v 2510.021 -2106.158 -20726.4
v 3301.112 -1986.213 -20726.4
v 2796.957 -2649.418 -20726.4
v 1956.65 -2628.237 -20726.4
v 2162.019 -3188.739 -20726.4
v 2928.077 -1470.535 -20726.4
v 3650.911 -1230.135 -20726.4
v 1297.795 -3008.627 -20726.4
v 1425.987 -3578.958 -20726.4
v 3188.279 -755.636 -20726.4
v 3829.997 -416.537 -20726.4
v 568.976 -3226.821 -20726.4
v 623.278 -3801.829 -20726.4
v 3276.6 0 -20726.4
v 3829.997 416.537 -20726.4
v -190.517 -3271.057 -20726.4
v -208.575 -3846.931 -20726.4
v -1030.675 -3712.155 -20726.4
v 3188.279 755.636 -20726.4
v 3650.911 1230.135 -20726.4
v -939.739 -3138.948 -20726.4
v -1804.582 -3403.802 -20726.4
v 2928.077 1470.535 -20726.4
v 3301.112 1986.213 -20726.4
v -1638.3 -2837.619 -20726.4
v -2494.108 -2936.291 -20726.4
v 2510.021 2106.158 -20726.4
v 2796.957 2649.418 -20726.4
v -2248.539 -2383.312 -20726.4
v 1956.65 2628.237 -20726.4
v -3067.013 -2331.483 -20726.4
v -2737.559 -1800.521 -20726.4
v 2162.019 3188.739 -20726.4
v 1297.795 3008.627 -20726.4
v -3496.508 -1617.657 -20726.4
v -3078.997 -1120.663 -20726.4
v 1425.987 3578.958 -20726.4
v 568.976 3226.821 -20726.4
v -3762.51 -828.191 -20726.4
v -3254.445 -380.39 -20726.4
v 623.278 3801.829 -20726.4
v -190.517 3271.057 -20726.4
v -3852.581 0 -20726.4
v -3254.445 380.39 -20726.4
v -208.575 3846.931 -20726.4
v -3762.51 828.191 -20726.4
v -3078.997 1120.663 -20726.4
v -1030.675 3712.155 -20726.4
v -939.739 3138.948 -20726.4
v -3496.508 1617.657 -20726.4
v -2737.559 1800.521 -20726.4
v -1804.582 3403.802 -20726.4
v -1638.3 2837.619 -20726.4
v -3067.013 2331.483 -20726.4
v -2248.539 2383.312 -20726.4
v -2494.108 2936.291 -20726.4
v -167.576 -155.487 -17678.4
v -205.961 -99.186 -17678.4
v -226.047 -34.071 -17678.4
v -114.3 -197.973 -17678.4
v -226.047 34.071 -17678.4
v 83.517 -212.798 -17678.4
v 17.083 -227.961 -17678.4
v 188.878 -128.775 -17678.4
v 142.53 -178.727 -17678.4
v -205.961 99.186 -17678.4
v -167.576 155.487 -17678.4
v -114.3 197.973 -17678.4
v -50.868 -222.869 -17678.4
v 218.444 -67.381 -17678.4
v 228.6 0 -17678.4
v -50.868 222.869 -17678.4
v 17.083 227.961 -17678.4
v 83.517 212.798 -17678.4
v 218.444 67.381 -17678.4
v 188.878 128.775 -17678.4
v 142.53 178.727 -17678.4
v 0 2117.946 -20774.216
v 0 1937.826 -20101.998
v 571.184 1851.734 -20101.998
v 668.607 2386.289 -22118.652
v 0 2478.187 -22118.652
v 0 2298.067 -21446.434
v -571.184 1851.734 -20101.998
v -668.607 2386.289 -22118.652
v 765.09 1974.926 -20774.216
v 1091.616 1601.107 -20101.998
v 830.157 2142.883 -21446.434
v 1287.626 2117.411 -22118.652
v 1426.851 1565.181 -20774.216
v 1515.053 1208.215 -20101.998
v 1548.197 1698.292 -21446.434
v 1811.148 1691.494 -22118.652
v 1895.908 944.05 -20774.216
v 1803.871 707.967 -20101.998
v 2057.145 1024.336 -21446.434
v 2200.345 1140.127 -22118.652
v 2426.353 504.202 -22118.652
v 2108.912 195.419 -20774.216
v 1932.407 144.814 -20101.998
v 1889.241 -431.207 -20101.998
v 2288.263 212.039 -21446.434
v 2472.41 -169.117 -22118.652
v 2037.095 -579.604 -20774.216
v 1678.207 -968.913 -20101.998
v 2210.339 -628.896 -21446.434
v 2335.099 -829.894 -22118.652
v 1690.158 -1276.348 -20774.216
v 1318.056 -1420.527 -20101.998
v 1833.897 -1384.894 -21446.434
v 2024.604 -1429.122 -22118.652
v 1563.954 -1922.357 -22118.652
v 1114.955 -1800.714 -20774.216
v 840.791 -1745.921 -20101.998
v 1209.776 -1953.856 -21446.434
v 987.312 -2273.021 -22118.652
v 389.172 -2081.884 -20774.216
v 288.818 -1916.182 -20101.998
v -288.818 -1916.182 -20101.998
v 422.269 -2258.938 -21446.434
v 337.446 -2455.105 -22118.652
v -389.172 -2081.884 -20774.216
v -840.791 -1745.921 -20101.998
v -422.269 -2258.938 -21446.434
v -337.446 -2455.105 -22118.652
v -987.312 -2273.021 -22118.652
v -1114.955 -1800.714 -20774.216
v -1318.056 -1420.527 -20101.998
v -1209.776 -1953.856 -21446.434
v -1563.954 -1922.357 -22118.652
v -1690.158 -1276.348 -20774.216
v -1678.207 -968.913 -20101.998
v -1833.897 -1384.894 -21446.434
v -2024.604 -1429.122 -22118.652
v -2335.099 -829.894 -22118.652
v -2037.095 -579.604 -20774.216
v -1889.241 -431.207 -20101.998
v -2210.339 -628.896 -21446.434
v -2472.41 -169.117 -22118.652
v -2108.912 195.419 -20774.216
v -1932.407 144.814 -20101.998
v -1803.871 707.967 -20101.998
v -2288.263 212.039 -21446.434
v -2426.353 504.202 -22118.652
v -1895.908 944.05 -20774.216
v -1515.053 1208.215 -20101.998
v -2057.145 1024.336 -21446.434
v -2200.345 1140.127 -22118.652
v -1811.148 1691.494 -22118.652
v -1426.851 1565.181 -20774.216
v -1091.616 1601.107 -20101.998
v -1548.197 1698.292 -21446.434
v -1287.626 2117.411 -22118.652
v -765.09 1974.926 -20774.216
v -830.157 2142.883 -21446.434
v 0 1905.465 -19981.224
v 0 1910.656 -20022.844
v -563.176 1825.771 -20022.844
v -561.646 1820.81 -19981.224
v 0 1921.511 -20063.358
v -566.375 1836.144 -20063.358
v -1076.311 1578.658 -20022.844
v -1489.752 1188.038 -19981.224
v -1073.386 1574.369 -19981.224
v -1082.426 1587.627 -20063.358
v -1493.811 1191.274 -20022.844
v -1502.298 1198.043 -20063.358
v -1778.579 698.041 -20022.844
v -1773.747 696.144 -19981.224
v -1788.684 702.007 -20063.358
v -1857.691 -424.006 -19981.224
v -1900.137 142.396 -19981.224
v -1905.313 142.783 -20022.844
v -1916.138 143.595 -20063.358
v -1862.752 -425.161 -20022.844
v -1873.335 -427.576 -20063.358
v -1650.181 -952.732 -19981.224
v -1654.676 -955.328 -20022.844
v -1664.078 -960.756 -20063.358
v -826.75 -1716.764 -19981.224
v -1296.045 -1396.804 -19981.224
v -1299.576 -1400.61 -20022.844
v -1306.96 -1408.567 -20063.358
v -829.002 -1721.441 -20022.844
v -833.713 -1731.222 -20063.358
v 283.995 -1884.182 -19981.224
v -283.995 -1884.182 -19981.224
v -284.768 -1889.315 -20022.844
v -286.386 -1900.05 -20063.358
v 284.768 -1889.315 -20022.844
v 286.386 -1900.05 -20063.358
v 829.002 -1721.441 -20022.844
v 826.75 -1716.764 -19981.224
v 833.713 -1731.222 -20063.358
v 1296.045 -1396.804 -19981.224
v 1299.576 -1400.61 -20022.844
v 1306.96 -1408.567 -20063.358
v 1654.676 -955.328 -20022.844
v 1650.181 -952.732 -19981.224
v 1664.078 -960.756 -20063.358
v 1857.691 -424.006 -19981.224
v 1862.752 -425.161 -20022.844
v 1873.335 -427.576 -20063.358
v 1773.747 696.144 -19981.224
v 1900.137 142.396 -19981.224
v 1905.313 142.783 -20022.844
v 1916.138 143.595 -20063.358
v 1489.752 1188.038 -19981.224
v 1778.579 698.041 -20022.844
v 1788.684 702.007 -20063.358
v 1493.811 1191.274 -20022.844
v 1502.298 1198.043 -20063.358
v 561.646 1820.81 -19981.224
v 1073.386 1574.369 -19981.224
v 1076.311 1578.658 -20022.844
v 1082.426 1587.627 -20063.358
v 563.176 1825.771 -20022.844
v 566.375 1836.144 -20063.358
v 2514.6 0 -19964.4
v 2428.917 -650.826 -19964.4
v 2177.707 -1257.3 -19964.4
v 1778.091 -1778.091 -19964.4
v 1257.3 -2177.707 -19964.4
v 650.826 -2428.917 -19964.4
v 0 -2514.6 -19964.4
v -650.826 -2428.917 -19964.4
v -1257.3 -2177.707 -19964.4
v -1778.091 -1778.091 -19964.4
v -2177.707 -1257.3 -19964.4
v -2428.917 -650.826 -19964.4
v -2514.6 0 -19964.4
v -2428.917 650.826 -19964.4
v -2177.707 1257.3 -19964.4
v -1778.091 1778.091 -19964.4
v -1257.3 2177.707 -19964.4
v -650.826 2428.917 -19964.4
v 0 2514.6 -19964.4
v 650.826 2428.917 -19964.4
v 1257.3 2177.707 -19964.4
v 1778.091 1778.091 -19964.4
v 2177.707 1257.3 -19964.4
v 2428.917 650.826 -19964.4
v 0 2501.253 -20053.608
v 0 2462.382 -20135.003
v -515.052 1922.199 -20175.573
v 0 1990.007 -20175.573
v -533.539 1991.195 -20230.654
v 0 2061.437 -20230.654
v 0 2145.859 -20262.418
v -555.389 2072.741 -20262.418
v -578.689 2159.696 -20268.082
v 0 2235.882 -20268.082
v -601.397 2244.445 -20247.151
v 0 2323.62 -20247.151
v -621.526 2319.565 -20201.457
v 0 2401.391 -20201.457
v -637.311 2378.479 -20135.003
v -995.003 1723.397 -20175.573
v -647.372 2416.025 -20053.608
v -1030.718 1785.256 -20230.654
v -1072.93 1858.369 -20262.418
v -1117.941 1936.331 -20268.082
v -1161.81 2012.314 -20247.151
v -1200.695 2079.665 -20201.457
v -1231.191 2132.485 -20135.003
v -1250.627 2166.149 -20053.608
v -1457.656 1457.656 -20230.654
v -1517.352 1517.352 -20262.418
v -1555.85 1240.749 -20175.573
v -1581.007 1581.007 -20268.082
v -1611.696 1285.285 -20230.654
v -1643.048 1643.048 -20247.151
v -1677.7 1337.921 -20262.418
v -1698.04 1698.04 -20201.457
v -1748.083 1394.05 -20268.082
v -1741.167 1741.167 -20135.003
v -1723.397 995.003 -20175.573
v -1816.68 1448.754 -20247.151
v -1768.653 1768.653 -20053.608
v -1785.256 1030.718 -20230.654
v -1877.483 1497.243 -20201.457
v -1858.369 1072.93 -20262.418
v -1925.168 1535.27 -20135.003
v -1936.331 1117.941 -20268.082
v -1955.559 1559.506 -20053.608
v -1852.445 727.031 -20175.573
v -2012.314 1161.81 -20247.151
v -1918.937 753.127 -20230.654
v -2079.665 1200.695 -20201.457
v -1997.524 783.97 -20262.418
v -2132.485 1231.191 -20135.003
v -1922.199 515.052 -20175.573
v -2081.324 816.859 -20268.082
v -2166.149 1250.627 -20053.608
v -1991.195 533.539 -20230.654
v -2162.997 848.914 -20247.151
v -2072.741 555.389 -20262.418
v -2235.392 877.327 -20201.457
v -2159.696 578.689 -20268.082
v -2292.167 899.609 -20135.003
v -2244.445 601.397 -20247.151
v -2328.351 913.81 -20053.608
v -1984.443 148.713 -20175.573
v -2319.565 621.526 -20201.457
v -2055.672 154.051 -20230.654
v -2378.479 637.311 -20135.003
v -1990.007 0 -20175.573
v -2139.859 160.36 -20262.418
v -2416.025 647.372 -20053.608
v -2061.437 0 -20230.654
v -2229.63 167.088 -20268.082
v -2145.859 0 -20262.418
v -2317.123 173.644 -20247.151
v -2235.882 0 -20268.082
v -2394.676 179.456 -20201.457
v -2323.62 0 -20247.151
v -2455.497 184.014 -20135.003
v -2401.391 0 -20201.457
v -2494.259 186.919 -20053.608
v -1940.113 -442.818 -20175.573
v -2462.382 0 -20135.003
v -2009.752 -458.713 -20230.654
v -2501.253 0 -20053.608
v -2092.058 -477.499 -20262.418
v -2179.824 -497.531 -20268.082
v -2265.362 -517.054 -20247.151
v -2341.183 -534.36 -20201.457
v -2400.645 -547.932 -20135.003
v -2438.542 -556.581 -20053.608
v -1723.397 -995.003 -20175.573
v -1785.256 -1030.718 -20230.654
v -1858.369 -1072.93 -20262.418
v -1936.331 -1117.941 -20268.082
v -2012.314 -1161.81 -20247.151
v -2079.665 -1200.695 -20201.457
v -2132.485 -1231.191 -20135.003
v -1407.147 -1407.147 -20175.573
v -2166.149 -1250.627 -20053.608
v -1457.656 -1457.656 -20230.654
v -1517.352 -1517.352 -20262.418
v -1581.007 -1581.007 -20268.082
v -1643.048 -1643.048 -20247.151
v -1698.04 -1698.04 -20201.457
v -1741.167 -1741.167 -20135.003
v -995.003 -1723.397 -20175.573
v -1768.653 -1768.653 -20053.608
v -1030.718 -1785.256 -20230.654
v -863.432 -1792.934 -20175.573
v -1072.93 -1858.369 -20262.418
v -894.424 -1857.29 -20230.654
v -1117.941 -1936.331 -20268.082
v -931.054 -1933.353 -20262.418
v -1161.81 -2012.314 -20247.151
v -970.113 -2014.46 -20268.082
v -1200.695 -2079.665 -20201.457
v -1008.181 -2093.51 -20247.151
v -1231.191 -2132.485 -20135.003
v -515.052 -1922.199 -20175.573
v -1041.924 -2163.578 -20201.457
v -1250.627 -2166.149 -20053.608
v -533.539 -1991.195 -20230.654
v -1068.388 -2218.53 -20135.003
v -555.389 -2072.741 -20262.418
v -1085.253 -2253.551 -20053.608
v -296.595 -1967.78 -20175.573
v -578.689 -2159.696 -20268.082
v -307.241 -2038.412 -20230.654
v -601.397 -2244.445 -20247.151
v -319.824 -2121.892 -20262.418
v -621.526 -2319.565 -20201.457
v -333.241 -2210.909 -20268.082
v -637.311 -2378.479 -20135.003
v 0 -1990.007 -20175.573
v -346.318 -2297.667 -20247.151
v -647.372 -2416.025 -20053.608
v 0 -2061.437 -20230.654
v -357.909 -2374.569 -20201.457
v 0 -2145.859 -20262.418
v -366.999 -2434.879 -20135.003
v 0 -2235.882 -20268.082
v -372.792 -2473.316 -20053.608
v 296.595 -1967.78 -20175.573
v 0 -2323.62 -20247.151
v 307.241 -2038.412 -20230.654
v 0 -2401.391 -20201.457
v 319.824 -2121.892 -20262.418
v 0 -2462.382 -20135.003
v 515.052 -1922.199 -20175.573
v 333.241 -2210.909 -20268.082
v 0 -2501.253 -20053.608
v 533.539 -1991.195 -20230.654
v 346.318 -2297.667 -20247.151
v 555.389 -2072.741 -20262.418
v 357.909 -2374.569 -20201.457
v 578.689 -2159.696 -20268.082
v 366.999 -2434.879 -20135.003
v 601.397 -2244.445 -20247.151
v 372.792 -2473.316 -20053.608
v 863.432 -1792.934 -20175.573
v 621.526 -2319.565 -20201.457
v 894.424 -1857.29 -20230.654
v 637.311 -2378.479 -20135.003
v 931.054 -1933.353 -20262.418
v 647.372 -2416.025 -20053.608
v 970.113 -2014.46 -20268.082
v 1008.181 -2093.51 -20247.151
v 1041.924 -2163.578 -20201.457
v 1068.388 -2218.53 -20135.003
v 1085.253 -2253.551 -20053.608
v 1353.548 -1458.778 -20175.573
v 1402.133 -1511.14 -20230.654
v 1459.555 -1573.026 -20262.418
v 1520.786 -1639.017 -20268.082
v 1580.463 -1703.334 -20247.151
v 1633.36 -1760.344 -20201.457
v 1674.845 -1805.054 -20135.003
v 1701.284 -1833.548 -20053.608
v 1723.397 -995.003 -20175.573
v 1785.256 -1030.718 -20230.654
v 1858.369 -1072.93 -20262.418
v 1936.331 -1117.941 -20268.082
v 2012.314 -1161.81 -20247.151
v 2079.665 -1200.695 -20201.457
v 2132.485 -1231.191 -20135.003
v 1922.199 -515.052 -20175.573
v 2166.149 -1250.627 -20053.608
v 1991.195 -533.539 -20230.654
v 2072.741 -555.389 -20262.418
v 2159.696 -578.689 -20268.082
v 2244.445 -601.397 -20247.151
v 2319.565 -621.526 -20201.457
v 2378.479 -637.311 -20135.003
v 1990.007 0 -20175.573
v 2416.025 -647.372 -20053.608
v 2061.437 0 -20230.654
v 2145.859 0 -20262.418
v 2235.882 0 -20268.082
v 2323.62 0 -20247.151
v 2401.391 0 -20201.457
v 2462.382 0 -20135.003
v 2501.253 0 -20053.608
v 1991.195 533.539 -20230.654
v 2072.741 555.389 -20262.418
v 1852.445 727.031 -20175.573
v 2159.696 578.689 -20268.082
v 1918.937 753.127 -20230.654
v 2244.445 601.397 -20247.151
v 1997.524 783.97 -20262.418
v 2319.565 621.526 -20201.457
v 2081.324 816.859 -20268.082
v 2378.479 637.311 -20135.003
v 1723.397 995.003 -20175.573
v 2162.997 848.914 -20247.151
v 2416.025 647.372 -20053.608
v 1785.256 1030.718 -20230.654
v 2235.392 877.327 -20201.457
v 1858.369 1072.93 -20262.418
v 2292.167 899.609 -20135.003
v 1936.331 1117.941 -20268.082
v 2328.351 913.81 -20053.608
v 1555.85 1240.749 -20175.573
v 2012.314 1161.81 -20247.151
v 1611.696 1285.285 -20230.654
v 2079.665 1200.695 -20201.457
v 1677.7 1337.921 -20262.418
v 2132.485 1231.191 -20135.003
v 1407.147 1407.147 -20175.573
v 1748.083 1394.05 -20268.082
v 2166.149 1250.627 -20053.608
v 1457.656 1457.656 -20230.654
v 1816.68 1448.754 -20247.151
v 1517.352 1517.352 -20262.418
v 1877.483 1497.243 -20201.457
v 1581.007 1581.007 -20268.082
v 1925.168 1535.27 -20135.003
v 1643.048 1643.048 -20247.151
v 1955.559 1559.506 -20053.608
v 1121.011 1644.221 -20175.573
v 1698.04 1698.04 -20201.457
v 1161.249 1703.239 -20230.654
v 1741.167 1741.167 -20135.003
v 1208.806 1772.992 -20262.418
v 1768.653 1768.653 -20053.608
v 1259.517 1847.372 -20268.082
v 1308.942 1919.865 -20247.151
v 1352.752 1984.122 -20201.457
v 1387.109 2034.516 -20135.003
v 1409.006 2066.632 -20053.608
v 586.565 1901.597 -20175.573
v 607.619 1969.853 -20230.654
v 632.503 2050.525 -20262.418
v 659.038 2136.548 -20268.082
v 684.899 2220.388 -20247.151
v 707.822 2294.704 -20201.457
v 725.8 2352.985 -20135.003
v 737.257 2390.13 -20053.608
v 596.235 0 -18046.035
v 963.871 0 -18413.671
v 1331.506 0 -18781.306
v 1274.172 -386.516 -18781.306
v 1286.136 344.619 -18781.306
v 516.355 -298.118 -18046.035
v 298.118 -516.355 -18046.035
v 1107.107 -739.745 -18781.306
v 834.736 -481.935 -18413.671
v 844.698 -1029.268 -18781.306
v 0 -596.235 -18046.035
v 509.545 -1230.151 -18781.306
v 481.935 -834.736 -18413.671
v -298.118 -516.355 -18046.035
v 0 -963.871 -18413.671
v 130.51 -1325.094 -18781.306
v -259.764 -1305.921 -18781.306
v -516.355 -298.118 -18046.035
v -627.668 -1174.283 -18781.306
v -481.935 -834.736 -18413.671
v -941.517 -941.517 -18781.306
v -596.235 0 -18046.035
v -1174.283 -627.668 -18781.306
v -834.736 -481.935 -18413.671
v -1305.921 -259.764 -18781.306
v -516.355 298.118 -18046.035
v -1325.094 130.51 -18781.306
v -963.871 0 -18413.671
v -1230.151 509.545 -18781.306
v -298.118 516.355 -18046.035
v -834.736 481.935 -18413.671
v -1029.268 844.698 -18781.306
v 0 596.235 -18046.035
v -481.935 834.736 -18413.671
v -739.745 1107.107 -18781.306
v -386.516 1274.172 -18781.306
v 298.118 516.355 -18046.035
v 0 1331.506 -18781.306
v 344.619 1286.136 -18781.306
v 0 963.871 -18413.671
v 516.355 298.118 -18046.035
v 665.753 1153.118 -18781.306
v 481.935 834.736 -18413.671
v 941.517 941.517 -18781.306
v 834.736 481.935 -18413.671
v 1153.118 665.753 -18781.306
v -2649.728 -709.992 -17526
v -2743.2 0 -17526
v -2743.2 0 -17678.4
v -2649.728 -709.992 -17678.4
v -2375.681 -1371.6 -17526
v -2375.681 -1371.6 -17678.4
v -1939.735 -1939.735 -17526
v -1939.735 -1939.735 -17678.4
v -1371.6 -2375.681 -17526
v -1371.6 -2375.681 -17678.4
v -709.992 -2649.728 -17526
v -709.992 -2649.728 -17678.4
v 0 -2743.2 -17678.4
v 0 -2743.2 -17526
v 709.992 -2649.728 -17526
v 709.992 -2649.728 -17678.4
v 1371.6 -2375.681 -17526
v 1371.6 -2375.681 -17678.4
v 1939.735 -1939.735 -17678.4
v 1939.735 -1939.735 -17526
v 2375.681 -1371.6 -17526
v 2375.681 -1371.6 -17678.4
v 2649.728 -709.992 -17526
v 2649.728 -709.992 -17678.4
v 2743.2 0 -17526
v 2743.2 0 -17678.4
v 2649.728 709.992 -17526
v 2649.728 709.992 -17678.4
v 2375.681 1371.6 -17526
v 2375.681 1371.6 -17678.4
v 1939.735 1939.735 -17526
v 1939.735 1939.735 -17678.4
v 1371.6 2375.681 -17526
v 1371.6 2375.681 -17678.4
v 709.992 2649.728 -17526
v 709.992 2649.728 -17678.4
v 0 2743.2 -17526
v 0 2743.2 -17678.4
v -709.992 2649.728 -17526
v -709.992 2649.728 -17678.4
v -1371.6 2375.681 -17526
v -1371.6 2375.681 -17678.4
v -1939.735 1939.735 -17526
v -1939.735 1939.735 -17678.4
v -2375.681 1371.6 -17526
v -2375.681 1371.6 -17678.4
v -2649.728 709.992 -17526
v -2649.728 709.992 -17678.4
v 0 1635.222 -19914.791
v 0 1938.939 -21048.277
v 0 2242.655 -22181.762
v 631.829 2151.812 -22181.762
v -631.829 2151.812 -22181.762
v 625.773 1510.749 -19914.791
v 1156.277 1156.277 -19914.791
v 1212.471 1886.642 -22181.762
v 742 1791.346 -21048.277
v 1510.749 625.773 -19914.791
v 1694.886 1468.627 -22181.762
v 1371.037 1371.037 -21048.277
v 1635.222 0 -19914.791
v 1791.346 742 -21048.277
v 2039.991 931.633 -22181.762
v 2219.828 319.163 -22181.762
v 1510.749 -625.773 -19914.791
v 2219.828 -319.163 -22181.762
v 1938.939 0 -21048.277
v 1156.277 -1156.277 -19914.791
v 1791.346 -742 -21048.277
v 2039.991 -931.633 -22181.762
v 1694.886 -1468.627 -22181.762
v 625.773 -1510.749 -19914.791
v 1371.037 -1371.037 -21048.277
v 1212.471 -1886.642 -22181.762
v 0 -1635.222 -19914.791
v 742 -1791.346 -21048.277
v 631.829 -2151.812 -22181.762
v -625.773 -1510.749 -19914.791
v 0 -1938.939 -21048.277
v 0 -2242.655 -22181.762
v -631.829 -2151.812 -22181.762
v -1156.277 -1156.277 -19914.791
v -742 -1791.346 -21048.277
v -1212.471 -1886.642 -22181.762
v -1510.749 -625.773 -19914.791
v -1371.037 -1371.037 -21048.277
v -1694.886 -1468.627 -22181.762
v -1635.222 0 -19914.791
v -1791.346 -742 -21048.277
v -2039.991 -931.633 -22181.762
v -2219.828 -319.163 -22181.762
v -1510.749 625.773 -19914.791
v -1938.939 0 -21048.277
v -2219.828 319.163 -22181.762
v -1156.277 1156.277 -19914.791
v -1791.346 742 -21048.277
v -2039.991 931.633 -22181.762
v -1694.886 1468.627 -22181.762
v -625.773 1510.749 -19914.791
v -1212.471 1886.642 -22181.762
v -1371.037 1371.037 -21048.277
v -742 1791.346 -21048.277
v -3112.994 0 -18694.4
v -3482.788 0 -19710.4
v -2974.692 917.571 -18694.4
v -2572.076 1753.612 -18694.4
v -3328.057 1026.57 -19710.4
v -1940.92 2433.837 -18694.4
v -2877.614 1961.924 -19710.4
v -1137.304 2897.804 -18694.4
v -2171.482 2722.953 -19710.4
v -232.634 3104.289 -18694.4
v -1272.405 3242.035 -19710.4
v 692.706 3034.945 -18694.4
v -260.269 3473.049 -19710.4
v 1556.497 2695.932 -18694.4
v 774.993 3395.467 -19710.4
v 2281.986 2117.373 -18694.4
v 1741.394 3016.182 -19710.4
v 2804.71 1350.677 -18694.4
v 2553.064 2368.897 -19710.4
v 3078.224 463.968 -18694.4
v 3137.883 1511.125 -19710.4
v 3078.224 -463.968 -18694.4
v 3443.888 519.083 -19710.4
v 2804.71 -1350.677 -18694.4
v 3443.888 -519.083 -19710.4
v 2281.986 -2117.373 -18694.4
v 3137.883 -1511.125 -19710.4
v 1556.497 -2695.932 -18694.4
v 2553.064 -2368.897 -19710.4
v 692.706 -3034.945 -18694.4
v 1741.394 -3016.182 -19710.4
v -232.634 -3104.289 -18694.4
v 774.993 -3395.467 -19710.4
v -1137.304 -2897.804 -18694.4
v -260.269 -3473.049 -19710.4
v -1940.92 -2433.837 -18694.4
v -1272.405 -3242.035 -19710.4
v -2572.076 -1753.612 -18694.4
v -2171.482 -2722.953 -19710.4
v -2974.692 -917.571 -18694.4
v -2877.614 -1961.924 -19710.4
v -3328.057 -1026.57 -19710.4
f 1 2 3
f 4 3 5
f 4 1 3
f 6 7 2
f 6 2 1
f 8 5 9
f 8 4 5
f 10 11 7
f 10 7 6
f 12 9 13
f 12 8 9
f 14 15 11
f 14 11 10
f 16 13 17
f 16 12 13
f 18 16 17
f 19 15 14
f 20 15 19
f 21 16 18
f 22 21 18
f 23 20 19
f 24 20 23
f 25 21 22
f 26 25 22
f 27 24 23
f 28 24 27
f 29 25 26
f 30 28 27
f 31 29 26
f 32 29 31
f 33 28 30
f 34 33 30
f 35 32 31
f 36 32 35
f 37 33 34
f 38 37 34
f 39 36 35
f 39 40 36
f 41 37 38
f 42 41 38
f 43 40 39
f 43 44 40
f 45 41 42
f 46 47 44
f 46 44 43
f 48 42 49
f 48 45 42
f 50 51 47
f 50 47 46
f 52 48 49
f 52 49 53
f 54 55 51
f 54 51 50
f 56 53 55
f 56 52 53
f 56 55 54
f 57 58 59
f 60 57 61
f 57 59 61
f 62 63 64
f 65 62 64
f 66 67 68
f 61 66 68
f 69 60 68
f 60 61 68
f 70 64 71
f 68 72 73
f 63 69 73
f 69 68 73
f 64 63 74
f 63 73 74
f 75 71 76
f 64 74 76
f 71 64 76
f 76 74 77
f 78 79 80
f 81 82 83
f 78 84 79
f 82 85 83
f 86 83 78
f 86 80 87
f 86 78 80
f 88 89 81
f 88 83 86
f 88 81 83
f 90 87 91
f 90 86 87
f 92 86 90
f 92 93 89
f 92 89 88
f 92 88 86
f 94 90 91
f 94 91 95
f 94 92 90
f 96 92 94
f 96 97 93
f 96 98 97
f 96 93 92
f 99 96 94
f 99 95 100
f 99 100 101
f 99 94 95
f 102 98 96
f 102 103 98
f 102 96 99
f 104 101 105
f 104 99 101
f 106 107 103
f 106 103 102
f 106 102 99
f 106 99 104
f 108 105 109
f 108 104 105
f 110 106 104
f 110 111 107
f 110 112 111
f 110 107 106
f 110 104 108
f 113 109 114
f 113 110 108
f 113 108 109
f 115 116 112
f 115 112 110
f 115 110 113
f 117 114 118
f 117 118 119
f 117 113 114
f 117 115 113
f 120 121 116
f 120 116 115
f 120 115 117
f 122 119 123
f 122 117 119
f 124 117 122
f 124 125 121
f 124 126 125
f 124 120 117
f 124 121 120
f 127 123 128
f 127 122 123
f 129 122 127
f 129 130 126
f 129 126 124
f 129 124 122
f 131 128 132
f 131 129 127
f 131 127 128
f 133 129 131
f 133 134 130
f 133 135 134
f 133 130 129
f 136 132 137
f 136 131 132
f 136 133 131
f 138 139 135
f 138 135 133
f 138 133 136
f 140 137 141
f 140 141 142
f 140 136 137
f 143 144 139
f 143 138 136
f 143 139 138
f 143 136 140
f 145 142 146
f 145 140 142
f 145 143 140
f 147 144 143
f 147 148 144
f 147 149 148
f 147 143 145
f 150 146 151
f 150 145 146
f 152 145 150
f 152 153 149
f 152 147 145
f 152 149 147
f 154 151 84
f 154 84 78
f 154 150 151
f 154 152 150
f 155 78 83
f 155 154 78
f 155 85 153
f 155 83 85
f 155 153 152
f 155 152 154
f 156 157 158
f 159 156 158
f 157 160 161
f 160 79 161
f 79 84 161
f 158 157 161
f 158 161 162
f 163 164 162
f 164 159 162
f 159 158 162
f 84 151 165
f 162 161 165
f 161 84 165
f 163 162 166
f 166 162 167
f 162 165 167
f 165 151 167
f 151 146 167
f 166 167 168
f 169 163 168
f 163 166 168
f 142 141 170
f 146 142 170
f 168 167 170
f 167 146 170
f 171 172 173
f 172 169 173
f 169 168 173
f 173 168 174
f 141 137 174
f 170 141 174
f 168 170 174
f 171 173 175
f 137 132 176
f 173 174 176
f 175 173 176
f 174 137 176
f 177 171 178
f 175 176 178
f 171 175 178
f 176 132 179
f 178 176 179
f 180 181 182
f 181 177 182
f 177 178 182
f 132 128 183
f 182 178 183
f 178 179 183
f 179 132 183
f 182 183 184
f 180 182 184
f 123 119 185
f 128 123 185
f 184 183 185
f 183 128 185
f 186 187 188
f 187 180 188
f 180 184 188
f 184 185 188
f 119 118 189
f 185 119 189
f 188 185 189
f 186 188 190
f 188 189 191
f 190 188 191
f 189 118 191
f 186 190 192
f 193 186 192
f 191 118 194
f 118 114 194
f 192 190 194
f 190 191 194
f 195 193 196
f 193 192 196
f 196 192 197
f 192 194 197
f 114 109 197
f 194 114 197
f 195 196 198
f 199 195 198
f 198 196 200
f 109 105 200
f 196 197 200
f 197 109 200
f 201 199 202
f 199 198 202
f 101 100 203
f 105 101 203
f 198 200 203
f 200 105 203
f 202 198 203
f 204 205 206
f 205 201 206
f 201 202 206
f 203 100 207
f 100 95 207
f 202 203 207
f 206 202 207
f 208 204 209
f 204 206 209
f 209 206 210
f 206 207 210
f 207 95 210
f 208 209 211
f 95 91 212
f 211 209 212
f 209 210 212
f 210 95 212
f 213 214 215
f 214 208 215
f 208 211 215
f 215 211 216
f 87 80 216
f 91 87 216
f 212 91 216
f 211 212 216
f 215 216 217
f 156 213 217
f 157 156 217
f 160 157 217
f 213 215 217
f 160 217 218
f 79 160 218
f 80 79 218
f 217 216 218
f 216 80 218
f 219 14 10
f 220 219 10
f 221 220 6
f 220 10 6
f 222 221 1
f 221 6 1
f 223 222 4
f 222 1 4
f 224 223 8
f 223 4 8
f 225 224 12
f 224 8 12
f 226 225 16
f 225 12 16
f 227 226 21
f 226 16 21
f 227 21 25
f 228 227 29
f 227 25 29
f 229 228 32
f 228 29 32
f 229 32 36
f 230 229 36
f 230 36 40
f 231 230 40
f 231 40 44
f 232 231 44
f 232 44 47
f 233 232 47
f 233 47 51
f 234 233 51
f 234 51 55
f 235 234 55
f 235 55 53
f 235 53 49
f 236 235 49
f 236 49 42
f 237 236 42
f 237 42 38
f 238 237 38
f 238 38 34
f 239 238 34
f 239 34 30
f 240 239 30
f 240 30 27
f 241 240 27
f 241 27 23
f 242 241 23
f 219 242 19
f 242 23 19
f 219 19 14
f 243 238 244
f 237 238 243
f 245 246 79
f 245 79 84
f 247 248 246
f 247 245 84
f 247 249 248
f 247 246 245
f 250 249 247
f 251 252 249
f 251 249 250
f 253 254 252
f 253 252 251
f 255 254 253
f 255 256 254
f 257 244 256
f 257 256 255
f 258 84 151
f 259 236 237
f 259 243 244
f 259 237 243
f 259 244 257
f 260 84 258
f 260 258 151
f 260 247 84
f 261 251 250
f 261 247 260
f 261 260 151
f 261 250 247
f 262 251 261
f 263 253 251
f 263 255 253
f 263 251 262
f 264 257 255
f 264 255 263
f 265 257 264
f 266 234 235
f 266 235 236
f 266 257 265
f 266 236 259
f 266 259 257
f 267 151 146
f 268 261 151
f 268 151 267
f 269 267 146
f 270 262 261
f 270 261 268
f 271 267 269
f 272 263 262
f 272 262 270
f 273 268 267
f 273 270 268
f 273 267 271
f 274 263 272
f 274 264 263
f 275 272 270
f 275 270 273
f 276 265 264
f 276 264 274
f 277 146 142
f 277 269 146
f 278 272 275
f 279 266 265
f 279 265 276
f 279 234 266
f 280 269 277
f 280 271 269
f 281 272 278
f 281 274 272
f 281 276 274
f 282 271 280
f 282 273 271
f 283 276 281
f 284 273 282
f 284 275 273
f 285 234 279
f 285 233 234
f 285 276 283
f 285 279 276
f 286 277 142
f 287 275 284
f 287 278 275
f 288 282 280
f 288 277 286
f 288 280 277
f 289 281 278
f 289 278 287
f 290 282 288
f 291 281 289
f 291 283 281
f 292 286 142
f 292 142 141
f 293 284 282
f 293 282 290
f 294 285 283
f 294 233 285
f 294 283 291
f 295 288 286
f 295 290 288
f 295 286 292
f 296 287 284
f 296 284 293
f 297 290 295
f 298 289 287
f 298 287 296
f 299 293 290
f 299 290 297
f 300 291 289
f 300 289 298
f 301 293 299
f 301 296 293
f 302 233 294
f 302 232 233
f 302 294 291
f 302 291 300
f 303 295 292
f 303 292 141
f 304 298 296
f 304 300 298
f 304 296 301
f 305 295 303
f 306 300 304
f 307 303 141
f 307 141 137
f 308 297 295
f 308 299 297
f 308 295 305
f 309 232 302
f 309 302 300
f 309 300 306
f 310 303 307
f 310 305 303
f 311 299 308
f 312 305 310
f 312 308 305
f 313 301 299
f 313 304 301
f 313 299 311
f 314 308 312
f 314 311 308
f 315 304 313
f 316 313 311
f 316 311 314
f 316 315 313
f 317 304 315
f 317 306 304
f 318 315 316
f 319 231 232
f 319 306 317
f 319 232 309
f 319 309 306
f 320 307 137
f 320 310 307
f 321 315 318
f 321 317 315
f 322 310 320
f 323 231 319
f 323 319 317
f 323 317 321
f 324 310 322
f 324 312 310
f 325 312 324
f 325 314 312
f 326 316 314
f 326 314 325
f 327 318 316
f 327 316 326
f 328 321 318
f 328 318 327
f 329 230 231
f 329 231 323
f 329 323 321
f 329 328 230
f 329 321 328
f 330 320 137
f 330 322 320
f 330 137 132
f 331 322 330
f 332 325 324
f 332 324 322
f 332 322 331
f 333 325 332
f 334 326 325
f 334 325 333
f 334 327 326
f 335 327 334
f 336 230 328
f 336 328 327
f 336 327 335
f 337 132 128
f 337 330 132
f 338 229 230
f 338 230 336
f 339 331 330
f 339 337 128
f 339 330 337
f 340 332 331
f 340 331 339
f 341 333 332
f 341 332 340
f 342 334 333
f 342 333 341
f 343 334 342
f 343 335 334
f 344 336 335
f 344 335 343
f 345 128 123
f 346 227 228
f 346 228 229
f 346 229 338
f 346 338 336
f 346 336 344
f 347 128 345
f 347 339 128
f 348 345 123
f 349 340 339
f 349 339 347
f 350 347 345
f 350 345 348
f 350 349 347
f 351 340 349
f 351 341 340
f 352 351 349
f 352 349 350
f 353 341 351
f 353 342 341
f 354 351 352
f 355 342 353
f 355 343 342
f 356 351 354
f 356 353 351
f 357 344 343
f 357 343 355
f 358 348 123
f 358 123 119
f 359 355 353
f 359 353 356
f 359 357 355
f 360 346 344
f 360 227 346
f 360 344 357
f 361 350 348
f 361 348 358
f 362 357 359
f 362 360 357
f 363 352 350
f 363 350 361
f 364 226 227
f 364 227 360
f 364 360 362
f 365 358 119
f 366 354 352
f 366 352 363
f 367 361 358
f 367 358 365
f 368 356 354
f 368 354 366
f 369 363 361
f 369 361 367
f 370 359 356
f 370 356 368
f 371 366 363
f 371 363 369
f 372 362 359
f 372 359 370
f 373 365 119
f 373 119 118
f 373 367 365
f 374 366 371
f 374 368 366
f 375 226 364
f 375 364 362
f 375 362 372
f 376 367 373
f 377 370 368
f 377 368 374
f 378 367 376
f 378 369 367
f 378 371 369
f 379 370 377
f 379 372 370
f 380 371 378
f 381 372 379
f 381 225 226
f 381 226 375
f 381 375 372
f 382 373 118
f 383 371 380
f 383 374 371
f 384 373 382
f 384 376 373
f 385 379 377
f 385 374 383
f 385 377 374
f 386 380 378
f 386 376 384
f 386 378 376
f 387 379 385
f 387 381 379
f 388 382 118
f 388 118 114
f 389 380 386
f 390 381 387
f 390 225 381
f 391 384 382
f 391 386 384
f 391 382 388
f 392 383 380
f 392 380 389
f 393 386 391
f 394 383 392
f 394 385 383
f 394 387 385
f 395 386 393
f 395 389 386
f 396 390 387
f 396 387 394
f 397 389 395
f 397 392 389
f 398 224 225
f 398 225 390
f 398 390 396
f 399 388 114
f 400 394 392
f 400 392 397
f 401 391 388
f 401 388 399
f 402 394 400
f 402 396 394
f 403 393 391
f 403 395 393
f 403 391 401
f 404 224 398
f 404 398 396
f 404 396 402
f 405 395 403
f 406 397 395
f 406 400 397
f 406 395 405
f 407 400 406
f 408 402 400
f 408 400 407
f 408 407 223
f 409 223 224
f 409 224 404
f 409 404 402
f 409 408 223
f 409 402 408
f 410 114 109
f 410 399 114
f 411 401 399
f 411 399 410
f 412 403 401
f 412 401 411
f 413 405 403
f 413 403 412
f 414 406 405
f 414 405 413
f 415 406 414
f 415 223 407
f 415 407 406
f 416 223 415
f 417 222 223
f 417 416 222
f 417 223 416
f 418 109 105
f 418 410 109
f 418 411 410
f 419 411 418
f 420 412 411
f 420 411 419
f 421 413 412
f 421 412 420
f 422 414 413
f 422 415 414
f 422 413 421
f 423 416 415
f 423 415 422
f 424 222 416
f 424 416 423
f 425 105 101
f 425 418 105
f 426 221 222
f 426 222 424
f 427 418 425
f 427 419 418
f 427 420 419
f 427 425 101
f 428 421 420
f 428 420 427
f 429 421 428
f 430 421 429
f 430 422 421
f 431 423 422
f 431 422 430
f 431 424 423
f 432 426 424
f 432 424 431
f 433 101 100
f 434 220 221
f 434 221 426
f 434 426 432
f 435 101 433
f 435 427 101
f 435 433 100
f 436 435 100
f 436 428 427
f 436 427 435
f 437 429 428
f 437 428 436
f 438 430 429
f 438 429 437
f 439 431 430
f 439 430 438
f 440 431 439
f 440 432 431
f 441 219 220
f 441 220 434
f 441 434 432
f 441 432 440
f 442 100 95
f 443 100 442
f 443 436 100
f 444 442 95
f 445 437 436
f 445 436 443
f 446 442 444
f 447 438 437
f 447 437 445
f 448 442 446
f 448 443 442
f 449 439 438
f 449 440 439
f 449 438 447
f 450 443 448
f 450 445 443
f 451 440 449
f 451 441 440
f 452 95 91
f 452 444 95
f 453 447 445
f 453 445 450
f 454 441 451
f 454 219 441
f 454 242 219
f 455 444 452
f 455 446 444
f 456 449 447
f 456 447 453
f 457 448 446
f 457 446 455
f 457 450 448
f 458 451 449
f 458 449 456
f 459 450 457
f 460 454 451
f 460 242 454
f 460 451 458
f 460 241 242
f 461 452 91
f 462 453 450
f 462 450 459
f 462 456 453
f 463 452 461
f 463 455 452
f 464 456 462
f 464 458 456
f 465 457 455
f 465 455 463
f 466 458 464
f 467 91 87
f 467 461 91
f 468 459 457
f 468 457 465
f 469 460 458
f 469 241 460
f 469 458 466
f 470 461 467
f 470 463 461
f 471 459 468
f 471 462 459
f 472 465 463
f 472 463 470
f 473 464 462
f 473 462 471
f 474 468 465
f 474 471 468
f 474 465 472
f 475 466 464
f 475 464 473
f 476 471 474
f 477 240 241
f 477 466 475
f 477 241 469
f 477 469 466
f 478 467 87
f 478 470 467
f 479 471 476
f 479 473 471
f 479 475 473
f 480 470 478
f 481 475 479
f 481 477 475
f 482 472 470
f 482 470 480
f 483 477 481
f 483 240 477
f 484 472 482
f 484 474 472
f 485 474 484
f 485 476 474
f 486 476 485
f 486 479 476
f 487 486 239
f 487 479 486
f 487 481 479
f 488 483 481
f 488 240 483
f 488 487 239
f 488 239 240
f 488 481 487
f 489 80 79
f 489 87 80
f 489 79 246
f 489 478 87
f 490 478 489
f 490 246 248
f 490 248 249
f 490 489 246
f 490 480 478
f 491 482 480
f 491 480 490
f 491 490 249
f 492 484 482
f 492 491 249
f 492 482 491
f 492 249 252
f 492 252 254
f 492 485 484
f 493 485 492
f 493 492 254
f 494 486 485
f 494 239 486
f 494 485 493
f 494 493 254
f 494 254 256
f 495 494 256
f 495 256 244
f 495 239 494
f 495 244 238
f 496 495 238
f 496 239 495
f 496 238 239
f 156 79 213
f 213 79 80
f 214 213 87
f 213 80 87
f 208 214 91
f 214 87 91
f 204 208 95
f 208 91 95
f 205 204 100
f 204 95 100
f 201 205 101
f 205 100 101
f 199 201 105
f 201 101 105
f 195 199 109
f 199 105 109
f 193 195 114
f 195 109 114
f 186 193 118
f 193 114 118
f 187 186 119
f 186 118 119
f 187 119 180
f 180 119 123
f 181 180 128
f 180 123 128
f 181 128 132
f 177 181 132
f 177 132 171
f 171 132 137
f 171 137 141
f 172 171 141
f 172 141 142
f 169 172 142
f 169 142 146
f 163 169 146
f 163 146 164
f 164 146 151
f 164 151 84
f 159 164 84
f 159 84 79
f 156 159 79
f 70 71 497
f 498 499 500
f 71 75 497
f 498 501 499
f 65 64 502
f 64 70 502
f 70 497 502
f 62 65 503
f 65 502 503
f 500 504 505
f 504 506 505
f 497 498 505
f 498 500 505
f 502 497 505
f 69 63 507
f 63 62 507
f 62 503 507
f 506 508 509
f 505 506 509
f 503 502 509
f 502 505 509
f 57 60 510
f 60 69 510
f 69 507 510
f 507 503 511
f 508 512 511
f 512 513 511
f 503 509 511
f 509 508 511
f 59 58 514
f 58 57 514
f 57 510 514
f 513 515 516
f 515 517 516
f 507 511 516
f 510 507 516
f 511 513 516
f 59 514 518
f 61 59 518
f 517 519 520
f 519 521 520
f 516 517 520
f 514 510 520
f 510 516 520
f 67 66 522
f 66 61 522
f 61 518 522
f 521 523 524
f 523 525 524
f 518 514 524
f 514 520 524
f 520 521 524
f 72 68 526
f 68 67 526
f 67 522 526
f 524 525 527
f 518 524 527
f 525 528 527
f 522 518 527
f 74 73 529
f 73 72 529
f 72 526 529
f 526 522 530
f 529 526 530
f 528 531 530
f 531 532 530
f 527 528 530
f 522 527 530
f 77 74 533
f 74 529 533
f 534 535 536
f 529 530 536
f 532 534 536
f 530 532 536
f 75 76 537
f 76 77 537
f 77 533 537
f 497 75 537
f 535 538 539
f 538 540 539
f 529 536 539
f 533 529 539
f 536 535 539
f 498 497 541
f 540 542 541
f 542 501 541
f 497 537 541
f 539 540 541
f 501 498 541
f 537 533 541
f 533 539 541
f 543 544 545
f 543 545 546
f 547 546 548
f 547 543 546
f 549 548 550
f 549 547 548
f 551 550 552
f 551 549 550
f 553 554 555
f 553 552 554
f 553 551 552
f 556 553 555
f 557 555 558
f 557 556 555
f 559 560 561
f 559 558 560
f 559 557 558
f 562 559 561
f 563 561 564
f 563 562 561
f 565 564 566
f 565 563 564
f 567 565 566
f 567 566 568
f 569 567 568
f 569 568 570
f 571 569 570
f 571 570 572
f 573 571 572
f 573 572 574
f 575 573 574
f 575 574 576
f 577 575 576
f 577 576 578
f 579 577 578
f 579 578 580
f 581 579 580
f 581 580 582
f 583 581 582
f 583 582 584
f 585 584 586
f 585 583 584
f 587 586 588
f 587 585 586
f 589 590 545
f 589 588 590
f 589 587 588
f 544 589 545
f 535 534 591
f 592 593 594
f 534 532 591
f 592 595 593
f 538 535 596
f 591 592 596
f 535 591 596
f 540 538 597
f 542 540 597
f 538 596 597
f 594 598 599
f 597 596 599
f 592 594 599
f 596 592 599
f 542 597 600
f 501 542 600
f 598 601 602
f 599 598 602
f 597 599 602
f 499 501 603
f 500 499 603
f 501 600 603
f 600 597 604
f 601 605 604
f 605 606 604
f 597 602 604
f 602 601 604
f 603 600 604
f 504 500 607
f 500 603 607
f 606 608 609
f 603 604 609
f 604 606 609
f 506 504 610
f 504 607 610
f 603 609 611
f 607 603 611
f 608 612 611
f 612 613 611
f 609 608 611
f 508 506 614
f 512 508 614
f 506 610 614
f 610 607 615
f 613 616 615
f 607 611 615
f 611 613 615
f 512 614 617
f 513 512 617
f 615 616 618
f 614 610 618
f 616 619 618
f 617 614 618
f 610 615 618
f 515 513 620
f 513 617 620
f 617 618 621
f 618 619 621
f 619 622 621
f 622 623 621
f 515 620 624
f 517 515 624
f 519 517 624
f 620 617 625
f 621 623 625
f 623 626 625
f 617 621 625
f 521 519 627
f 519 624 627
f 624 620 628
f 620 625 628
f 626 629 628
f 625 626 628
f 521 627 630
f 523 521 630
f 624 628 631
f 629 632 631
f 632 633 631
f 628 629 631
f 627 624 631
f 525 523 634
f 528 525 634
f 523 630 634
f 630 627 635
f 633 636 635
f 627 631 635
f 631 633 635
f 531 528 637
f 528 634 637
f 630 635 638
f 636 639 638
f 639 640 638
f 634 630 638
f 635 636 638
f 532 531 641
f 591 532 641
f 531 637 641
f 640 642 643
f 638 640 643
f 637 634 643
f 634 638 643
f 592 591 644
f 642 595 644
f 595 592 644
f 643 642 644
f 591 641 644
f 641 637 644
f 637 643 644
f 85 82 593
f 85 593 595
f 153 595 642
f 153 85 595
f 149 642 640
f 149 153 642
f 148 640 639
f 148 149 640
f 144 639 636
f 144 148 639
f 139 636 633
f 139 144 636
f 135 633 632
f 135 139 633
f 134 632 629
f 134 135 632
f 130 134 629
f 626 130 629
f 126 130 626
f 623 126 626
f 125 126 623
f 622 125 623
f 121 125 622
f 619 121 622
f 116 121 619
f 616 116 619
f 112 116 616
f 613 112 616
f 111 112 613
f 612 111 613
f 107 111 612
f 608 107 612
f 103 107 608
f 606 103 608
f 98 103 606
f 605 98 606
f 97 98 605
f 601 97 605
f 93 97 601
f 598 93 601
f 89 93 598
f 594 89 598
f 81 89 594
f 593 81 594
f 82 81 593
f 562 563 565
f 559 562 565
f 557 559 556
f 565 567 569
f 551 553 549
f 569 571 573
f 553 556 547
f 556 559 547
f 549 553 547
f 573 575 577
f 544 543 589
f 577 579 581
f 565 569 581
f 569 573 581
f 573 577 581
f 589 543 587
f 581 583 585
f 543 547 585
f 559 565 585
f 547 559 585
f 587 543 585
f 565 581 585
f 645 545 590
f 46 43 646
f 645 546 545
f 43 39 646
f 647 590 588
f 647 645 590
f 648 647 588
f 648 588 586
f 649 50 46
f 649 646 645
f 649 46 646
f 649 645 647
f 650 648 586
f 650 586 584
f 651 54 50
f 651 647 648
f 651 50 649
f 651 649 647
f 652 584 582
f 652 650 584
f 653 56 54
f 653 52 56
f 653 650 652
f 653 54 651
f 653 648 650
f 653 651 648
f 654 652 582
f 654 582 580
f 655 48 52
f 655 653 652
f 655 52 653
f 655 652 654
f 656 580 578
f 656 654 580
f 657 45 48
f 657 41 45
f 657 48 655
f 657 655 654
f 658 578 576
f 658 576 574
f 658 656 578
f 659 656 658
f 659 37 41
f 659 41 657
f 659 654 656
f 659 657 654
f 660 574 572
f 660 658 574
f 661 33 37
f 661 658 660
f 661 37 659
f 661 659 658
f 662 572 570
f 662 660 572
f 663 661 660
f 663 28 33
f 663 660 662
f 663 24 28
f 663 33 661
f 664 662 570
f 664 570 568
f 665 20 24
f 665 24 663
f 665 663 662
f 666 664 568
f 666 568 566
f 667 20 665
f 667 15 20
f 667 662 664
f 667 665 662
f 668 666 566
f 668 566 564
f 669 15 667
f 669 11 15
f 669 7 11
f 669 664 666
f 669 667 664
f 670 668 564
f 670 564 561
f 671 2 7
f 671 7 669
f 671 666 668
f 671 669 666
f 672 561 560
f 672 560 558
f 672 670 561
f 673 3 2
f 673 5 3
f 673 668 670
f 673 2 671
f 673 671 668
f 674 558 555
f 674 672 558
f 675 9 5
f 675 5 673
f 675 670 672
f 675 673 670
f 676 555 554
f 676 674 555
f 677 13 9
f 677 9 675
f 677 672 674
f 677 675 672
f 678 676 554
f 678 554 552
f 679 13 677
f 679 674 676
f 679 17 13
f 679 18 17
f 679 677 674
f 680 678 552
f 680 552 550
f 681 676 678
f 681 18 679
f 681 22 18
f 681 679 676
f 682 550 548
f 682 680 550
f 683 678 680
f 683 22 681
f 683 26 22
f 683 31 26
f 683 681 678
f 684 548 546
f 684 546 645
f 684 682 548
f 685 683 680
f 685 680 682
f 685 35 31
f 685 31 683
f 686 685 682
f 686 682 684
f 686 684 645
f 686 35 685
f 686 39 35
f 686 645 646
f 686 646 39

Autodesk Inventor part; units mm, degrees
ref_plane "YZ Plane" through (0, 0, 0) normal (1, 0, 0) x (0, 1, 0)
ref_plane "Work Plane3" through (0, 0, 17526) normal (0, 0, 1) x (1, 0, 0)
sketch "Sketch7" plane through (0, 0, 17526) normal (0, 0, 1) x (1, 0, 0)
  point P0 (0, 0)
ref_plane "Work Plane2" through (0, 0, -17526) normal (0, 0, -1) x (-1, 0, 0)
sketch "Sketch9" plane through (0, 0, -17526) normal (0, 0, -1) x (-1, 0, 0)
  circle A0 centre (0, 0) radius 2743.2
extrude "Extrusion5" add sketch "Sketch9" along normal blind 152.4
sketch "Sketch11" plane through (0, 0, -17678.4) normal (0, 0, -1) x (-1, 0, 0)
  circle A0 centre (0, 0) radius 2743.2
extrude "Extrusion7" add sketch "Sketch11" along normal blind 3048 draft 20
ref_plane "Work Plane4" through (0, 0, -17678.4) normal (0, 0, 1) x (1, 0, 0)
sketch "Sketch12" plane through (0, 0, -17678.4) normal (0, 0, 1) x (1, 0, 0)
  circle A0 centre (0, 0) radius 228.6
  dimension "d36" = 457.2
extrude "Extrusion8" cut sketch "Sketch12" against normal blind 3048 draft 45
sketch "Sketch13" plane through (0, 0, 0) normal (1, 0, 0) x (0, 1, 0)
  line L0 (0, -17526) -> (0, -19964.4)
  arc A0 (1905.4646, -19981.2236) -> (2514.6, -19964.4) centre (2209.8, -19964.4) ccw
  line L1 (1905.4646, -19981.2236) -> (4118.293, -19981.2236) construction
  line L2 (2478.1868, -22118.6516) -> (1905.4646, -19981.2236)
  line L3 (2478.1868, -22118.6516) -> (2242.6554, -22181.762)
  line L4 (2242.6554, -22181.762) -> (1331.5059, -18781.3059)
  line L5 (2514.6, -19964.4) -> (1331.5059, -18781.3059)
  point P0 (0, 0)
  point P1 (1937.8261, -20101.998)
  dimension "d39" = 2438.4
revolve "Revolution5" add sketch "Sketch13" angle 360 about axis through (0, 0, -17526) along (0, 0, -1)
properties part number "srb_thrusters_and_vectors" material "Steel, Mild"
